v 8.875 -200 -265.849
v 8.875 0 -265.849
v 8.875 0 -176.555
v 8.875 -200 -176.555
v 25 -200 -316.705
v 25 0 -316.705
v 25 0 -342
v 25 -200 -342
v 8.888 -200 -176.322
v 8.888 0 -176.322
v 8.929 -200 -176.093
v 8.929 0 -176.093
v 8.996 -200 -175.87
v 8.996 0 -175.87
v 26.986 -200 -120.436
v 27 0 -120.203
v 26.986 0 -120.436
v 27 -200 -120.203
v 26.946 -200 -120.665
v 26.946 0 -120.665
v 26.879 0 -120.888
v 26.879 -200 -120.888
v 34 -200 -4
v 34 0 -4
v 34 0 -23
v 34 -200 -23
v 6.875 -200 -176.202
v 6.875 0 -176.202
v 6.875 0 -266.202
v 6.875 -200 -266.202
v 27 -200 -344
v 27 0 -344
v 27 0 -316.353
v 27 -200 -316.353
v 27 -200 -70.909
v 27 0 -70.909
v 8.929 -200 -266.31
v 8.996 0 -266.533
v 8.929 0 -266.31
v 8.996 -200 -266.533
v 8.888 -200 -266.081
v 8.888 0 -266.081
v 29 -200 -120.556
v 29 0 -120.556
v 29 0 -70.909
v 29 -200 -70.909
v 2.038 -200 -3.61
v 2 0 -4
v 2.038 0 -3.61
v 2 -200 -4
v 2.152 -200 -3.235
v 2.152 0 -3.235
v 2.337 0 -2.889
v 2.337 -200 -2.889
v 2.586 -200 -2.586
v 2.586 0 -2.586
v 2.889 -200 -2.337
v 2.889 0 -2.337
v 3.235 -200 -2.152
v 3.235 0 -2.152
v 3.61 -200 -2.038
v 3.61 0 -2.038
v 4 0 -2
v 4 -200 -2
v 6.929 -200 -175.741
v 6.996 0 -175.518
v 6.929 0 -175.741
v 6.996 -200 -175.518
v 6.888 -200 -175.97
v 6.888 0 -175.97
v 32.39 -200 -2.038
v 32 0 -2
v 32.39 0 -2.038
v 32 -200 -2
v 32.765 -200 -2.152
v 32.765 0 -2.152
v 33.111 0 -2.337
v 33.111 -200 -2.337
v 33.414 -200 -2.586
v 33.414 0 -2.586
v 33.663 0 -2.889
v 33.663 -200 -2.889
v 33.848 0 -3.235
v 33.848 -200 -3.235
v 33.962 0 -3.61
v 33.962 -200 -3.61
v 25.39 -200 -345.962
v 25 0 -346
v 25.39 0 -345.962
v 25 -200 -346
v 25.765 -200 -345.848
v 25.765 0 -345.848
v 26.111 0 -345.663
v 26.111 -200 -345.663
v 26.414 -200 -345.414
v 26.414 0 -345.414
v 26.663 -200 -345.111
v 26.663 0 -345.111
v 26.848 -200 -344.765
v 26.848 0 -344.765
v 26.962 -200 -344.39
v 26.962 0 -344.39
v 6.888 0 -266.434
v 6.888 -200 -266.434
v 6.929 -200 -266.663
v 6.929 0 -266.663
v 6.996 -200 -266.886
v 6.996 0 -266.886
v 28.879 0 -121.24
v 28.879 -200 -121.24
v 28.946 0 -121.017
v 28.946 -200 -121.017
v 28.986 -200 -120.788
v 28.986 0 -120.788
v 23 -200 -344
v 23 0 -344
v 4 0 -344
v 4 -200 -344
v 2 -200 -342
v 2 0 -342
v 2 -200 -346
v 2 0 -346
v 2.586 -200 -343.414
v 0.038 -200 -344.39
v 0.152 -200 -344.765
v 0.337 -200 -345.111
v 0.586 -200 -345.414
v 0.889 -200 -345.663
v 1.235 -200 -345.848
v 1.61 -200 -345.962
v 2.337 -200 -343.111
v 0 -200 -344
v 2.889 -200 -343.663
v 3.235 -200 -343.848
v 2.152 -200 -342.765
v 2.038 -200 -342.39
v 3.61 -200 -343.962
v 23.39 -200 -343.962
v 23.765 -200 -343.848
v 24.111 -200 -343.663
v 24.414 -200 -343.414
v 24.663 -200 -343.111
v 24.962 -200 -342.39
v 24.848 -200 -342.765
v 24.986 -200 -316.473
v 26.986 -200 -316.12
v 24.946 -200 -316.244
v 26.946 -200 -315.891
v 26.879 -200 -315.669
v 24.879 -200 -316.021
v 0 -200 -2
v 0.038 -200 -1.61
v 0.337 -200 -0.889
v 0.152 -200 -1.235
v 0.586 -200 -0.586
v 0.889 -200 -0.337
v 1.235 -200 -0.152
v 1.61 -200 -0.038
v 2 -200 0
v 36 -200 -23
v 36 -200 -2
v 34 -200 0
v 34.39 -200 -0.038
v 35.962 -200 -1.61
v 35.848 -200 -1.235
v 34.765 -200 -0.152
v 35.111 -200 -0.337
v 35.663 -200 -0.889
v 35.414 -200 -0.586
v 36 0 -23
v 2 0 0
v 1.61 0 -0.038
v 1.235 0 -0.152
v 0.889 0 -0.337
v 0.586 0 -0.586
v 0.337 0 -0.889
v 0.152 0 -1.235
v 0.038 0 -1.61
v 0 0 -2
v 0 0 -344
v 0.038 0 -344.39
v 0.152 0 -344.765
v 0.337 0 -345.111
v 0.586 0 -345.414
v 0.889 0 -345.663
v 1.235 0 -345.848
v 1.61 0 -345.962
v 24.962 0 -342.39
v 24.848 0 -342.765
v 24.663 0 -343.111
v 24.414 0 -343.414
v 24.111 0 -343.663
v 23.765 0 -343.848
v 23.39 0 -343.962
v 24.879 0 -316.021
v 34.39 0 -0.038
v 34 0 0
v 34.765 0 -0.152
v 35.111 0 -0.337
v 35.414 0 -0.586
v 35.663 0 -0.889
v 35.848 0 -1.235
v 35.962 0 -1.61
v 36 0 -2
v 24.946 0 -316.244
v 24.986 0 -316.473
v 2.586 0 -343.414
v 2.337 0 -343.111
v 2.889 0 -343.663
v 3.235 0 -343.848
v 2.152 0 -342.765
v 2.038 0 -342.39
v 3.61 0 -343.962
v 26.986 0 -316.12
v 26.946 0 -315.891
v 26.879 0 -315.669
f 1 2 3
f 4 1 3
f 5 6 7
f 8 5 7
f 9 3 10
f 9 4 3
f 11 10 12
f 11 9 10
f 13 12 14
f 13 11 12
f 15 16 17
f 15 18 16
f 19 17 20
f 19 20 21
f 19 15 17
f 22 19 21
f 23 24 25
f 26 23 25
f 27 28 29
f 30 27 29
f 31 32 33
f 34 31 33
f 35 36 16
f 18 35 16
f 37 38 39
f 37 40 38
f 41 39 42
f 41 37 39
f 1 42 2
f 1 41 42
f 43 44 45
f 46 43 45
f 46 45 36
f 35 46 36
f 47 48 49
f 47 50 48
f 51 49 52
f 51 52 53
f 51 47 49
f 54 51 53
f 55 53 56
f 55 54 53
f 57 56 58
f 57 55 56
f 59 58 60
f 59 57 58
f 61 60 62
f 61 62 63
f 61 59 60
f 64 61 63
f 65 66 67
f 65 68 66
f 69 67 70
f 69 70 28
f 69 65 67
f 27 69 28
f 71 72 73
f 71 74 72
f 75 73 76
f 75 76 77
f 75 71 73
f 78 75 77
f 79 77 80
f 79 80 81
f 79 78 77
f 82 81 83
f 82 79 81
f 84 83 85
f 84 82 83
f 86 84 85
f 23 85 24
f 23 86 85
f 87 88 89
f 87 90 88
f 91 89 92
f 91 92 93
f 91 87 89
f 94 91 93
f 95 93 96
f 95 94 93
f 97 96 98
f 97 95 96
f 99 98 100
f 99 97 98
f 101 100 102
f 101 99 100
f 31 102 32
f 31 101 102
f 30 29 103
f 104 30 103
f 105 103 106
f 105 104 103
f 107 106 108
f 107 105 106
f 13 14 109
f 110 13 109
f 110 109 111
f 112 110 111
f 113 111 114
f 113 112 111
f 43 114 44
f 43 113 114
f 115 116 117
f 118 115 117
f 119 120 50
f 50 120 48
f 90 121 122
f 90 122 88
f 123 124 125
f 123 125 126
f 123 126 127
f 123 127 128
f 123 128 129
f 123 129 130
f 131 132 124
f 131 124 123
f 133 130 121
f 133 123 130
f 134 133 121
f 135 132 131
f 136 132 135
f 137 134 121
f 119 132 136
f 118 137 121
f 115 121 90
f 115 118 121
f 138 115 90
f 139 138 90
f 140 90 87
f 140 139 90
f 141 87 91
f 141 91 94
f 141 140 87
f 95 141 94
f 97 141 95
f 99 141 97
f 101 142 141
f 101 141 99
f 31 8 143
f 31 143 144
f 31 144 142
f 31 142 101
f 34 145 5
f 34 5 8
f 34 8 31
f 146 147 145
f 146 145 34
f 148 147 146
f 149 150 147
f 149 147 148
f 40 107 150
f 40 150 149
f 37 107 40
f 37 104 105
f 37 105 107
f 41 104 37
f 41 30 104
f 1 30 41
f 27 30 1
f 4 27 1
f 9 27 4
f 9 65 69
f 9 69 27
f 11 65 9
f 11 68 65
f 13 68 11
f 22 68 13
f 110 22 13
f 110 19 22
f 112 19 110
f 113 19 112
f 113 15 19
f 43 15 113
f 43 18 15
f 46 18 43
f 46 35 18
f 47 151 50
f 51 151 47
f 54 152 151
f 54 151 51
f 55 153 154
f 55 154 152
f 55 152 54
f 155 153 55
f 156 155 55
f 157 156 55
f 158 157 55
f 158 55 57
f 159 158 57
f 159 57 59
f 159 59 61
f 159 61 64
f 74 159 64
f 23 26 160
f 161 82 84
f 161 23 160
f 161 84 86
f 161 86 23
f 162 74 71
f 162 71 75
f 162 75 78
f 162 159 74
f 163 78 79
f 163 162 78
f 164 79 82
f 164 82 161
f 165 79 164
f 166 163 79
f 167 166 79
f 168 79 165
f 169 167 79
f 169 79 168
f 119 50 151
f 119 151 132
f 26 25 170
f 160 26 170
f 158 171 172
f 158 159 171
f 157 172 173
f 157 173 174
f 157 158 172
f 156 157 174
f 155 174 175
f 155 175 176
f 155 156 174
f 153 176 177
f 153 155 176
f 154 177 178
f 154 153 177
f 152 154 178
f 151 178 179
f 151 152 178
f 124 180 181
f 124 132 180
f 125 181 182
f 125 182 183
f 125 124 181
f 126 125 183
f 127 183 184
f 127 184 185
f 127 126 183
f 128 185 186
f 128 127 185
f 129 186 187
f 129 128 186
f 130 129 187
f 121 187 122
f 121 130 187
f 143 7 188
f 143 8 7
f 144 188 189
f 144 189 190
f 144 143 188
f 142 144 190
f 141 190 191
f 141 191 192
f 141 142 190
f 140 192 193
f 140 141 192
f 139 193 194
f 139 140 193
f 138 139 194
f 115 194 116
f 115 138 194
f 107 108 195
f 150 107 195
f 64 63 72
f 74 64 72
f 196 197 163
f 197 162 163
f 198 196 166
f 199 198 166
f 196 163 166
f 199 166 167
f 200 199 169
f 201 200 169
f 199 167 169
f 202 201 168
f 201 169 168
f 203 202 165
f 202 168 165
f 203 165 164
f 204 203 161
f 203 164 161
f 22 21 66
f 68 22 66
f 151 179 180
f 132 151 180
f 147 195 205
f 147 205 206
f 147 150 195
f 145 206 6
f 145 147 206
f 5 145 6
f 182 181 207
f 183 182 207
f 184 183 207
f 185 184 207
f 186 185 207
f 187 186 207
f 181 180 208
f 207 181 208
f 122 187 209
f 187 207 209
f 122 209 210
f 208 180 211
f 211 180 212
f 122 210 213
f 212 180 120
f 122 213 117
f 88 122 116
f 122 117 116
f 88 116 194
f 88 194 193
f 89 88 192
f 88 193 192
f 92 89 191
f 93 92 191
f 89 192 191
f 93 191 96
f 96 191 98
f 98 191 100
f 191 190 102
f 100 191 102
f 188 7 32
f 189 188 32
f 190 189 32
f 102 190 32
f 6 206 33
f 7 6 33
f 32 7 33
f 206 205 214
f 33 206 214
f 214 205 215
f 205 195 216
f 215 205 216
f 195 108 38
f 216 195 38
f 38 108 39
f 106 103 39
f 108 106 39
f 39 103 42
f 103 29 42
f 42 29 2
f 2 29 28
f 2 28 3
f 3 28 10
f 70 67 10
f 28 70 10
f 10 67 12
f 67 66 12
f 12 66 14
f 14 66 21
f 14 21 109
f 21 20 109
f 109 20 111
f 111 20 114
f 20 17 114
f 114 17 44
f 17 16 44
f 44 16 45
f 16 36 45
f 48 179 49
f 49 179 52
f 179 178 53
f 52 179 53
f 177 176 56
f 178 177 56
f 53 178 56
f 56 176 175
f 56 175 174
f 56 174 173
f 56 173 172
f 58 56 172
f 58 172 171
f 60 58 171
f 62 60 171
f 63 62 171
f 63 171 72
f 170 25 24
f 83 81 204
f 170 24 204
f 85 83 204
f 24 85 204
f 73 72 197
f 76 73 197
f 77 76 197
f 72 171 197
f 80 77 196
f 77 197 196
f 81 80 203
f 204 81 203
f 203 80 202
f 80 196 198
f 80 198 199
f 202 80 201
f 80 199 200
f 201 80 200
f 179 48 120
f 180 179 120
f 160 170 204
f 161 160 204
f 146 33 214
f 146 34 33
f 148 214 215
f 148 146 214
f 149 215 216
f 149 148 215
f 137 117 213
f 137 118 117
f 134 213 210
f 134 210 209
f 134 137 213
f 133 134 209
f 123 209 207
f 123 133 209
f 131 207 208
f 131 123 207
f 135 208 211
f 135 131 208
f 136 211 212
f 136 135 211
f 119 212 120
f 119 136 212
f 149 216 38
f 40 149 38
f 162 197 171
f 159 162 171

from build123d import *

# Parameters (mm, degrees)
F1_DEPTH = 200
F2_R     = 2


with BuildPart() as f1:
    # F0 (on Front) → F1 (new body)
    with BuildSketch(Plane.XZ):
        Polygon((36, 0), (0, 0), (0, -346), (27, -346), (27, -316), (8.874961, -266.201865), (8.874961, -176.201865), (29, -120.908776), (29, -70.908776), (27, -70.908776), (27, -120.556122), (6.874961, -175.849212), (6.874961, -266.554519), (25, -316.352654), (25, -344), (2, -344), (2, -2), (34, -2), (34, -23), (36, -23), align=None)
    extrude(amount=F1_DEPTH)

    # F2
    f2_edges = [f1.edges().sort_by_distance(p)[0] for p in [
        (0, -100, 0),
        (36, -100, 0),
        (34, -100, -2),
        (2, -100, -2),
        (0, -100, -346),
        (2, -100, -344),
        (27, -100, -346),
        (25, -100, -344),
        (25, -100, -316.352654),
        (27, -100, -316),
        (8.874961, -100, -266.201865),
        (6.874961, -100, -266.554519),
        (6.874961, -100, -175.849212),
        (8.874961, -100, -176.201865),
        (29, -100, -120.908776),
        (27, -100, -120.556122),
    ]]
    fillet(f2_edges, radius=F2_R)


solid = f1.part
